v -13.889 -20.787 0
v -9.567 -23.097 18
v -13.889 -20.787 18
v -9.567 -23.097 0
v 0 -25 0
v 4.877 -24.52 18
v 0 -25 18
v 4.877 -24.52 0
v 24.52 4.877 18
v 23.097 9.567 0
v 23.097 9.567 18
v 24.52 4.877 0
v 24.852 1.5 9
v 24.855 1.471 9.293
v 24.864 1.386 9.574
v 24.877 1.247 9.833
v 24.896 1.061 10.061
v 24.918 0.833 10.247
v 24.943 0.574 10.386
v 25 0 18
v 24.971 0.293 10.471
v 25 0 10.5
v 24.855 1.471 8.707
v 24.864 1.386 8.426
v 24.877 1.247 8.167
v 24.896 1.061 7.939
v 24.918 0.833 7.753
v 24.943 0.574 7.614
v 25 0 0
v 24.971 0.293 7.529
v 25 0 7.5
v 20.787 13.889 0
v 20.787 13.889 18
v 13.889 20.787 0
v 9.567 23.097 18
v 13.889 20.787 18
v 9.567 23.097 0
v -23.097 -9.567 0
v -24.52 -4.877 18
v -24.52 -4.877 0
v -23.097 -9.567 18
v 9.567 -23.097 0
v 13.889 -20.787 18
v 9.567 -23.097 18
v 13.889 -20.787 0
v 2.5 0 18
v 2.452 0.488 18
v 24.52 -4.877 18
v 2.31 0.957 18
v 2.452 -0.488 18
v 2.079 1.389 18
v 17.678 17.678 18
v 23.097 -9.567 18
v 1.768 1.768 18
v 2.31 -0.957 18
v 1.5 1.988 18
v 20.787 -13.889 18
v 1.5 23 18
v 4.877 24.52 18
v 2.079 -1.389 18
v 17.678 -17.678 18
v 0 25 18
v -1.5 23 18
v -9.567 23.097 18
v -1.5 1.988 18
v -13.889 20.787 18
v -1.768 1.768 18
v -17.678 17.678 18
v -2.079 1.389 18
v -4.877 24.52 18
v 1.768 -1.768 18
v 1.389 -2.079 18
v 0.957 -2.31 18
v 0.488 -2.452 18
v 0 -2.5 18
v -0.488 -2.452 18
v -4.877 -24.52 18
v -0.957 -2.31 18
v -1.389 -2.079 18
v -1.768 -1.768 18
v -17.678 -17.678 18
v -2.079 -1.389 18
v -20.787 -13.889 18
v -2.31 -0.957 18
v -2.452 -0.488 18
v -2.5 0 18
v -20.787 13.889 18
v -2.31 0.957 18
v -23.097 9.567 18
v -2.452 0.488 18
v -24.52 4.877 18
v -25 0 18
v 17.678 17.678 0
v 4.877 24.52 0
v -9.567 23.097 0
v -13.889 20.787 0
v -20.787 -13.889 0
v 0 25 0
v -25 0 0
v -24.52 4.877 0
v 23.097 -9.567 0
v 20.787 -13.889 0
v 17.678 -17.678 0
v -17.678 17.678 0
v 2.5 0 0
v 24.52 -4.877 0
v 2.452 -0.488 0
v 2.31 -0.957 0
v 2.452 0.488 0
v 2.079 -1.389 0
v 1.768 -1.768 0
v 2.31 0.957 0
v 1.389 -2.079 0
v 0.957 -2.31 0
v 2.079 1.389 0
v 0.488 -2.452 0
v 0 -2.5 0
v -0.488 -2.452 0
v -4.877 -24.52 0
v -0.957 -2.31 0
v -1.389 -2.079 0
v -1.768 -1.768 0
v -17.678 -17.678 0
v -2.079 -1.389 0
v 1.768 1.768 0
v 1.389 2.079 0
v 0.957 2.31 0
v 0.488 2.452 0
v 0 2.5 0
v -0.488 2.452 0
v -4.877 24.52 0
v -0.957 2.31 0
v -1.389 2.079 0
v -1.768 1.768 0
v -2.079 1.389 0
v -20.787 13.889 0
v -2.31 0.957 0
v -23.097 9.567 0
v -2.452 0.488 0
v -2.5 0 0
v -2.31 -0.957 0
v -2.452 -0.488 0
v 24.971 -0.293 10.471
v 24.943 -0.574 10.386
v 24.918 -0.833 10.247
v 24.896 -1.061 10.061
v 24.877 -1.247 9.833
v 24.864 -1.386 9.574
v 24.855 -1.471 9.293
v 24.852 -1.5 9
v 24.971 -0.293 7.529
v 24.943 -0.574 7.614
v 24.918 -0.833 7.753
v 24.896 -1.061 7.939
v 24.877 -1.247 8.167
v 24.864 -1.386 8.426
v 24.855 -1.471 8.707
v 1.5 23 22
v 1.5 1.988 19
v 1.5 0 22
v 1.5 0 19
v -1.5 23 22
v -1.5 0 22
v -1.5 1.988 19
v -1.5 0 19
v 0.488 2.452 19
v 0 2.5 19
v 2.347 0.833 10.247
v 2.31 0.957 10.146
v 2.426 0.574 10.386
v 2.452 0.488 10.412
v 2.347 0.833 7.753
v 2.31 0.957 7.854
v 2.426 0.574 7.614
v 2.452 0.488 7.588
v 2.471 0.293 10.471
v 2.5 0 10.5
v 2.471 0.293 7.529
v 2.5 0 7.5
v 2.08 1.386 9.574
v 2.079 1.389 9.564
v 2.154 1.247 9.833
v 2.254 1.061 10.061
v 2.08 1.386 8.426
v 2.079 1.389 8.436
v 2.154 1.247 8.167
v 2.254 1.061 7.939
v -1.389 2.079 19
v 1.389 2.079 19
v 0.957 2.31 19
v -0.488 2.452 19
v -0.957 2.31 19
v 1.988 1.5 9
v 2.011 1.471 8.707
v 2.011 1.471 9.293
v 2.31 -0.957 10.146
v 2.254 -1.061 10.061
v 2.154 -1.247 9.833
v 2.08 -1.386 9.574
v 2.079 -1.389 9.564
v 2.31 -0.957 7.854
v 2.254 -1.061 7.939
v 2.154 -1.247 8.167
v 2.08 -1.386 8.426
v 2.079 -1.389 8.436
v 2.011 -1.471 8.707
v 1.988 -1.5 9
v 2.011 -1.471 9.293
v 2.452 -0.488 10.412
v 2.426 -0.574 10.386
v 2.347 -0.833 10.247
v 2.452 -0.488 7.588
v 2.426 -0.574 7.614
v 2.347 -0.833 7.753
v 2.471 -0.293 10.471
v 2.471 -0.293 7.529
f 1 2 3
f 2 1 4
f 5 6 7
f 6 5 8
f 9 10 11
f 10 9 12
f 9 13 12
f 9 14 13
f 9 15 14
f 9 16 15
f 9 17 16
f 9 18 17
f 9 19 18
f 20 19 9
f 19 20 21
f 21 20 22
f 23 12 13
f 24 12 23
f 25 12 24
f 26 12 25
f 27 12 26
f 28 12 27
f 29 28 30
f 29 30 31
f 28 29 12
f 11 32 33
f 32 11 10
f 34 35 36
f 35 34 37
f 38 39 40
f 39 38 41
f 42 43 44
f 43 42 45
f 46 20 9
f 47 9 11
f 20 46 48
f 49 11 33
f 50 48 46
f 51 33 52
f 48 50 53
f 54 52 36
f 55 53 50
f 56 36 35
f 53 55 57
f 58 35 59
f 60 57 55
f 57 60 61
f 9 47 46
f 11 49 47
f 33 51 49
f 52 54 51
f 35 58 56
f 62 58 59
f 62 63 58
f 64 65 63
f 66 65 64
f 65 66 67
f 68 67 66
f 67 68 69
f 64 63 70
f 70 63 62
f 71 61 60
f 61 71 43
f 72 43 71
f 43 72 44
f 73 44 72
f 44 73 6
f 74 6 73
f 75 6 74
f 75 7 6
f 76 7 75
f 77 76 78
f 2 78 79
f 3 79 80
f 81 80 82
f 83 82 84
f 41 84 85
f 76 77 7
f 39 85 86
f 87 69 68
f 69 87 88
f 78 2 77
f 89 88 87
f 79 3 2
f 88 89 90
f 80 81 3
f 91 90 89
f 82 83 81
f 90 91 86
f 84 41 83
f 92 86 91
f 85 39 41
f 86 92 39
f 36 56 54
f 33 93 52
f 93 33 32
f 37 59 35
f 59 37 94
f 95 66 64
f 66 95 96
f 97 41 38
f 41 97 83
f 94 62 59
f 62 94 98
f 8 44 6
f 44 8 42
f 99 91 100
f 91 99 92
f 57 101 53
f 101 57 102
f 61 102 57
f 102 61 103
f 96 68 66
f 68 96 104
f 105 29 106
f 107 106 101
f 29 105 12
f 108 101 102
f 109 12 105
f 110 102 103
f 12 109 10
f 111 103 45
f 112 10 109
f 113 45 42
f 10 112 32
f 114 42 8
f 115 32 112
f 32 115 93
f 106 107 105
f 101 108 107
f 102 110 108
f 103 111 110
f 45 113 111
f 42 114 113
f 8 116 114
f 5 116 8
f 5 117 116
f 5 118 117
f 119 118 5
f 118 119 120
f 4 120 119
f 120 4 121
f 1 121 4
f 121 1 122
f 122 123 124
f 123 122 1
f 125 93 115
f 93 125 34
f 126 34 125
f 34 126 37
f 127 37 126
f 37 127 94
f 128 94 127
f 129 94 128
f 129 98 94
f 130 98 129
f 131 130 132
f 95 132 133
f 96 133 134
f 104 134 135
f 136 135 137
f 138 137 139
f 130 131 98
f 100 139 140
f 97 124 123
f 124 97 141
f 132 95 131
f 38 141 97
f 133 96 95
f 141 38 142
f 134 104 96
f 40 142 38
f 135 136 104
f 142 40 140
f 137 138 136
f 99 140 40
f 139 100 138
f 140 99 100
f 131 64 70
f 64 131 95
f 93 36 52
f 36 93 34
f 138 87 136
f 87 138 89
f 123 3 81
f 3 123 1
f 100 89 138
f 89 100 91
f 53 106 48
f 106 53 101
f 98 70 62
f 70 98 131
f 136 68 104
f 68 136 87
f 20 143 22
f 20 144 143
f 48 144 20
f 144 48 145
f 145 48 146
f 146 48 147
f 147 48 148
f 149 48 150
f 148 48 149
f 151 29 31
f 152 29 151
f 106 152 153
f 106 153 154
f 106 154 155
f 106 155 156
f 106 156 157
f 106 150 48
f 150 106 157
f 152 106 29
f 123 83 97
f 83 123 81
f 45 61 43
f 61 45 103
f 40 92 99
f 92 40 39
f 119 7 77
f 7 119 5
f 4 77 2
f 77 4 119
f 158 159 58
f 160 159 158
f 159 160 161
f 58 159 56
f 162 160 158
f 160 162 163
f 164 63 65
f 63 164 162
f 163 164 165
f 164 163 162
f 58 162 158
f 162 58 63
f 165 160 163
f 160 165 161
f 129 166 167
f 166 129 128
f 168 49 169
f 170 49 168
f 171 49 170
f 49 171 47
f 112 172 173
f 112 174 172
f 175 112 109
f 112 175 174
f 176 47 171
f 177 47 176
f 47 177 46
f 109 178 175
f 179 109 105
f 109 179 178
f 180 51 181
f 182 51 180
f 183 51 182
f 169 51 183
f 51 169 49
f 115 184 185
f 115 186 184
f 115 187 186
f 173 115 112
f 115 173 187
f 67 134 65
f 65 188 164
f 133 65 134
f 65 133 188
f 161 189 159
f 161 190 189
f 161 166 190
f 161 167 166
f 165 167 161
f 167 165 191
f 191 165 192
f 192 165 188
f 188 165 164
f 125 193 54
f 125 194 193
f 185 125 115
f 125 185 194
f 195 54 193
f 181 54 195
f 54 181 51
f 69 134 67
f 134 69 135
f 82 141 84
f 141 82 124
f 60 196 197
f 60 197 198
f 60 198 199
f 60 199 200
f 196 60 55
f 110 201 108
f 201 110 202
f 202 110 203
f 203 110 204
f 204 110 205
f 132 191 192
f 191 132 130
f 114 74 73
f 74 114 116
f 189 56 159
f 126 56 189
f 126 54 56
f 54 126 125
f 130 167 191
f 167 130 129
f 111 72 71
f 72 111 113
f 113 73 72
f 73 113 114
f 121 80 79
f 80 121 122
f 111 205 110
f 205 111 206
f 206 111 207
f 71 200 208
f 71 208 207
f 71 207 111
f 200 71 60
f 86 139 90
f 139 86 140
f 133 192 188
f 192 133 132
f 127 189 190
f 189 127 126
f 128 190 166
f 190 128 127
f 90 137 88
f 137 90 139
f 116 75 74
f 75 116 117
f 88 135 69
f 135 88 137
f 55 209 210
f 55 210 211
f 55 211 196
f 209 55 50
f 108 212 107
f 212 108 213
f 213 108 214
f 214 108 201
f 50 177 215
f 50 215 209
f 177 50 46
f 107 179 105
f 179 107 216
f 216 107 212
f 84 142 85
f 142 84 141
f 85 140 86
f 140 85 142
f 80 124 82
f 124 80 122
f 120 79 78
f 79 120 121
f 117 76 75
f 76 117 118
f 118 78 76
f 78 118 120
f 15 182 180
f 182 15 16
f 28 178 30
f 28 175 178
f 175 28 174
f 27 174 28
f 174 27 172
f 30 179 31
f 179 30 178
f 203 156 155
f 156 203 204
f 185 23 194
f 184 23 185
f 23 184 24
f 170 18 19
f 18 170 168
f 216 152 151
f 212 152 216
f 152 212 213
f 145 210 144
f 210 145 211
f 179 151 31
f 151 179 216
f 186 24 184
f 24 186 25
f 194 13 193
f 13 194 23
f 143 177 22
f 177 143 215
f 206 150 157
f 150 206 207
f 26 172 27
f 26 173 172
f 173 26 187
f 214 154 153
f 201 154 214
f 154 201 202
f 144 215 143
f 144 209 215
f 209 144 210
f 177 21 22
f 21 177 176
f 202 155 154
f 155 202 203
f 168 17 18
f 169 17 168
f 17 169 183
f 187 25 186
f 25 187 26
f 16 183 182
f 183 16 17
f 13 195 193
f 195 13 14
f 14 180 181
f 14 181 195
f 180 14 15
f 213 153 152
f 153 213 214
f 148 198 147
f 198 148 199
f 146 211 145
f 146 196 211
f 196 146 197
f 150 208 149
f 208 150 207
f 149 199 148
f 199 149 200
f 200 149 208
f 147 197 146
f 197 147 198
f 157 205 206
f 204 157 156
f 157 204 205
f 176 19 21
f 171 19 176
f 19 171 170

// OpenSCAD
$fn = 32;

// ----------------------------------------------------------------------
// Control knob: pointer knob
// ----------------------------------------------------------------------

// --- parameters (mm) ---
rib_w = 3;                // pointer rib width
rib_h = 5;                // pointer rib height
knob_d = 50;              // knob body diameter
knob_h = 18;              // knob body height
bore_d = 5;               // shaft bore diameter
set_d = 3;                // set screw bore diameter

rib_poke = rib_h - 1;  // rib height above the top
total_h = knob_h + rib_h - 1;  // overall height

difference() {
  union() {
    cylinder(h = knob_h, d = knob_d);
    translate([-rib_w / 2, 0, knob_h - 1])
      cube([rib_w, knob_d / 2 - 2, rib_h]);
  }
  translate([0, 0, -1]) cylinder(h = knob_h + 2, d = bore_d);
  translate([-1, 0, knob_h / 2]) rotate([0, 90, 0])
    cylinder(h = knob_d / 2 + bore_d / 2 + 2, d = set_d);}
